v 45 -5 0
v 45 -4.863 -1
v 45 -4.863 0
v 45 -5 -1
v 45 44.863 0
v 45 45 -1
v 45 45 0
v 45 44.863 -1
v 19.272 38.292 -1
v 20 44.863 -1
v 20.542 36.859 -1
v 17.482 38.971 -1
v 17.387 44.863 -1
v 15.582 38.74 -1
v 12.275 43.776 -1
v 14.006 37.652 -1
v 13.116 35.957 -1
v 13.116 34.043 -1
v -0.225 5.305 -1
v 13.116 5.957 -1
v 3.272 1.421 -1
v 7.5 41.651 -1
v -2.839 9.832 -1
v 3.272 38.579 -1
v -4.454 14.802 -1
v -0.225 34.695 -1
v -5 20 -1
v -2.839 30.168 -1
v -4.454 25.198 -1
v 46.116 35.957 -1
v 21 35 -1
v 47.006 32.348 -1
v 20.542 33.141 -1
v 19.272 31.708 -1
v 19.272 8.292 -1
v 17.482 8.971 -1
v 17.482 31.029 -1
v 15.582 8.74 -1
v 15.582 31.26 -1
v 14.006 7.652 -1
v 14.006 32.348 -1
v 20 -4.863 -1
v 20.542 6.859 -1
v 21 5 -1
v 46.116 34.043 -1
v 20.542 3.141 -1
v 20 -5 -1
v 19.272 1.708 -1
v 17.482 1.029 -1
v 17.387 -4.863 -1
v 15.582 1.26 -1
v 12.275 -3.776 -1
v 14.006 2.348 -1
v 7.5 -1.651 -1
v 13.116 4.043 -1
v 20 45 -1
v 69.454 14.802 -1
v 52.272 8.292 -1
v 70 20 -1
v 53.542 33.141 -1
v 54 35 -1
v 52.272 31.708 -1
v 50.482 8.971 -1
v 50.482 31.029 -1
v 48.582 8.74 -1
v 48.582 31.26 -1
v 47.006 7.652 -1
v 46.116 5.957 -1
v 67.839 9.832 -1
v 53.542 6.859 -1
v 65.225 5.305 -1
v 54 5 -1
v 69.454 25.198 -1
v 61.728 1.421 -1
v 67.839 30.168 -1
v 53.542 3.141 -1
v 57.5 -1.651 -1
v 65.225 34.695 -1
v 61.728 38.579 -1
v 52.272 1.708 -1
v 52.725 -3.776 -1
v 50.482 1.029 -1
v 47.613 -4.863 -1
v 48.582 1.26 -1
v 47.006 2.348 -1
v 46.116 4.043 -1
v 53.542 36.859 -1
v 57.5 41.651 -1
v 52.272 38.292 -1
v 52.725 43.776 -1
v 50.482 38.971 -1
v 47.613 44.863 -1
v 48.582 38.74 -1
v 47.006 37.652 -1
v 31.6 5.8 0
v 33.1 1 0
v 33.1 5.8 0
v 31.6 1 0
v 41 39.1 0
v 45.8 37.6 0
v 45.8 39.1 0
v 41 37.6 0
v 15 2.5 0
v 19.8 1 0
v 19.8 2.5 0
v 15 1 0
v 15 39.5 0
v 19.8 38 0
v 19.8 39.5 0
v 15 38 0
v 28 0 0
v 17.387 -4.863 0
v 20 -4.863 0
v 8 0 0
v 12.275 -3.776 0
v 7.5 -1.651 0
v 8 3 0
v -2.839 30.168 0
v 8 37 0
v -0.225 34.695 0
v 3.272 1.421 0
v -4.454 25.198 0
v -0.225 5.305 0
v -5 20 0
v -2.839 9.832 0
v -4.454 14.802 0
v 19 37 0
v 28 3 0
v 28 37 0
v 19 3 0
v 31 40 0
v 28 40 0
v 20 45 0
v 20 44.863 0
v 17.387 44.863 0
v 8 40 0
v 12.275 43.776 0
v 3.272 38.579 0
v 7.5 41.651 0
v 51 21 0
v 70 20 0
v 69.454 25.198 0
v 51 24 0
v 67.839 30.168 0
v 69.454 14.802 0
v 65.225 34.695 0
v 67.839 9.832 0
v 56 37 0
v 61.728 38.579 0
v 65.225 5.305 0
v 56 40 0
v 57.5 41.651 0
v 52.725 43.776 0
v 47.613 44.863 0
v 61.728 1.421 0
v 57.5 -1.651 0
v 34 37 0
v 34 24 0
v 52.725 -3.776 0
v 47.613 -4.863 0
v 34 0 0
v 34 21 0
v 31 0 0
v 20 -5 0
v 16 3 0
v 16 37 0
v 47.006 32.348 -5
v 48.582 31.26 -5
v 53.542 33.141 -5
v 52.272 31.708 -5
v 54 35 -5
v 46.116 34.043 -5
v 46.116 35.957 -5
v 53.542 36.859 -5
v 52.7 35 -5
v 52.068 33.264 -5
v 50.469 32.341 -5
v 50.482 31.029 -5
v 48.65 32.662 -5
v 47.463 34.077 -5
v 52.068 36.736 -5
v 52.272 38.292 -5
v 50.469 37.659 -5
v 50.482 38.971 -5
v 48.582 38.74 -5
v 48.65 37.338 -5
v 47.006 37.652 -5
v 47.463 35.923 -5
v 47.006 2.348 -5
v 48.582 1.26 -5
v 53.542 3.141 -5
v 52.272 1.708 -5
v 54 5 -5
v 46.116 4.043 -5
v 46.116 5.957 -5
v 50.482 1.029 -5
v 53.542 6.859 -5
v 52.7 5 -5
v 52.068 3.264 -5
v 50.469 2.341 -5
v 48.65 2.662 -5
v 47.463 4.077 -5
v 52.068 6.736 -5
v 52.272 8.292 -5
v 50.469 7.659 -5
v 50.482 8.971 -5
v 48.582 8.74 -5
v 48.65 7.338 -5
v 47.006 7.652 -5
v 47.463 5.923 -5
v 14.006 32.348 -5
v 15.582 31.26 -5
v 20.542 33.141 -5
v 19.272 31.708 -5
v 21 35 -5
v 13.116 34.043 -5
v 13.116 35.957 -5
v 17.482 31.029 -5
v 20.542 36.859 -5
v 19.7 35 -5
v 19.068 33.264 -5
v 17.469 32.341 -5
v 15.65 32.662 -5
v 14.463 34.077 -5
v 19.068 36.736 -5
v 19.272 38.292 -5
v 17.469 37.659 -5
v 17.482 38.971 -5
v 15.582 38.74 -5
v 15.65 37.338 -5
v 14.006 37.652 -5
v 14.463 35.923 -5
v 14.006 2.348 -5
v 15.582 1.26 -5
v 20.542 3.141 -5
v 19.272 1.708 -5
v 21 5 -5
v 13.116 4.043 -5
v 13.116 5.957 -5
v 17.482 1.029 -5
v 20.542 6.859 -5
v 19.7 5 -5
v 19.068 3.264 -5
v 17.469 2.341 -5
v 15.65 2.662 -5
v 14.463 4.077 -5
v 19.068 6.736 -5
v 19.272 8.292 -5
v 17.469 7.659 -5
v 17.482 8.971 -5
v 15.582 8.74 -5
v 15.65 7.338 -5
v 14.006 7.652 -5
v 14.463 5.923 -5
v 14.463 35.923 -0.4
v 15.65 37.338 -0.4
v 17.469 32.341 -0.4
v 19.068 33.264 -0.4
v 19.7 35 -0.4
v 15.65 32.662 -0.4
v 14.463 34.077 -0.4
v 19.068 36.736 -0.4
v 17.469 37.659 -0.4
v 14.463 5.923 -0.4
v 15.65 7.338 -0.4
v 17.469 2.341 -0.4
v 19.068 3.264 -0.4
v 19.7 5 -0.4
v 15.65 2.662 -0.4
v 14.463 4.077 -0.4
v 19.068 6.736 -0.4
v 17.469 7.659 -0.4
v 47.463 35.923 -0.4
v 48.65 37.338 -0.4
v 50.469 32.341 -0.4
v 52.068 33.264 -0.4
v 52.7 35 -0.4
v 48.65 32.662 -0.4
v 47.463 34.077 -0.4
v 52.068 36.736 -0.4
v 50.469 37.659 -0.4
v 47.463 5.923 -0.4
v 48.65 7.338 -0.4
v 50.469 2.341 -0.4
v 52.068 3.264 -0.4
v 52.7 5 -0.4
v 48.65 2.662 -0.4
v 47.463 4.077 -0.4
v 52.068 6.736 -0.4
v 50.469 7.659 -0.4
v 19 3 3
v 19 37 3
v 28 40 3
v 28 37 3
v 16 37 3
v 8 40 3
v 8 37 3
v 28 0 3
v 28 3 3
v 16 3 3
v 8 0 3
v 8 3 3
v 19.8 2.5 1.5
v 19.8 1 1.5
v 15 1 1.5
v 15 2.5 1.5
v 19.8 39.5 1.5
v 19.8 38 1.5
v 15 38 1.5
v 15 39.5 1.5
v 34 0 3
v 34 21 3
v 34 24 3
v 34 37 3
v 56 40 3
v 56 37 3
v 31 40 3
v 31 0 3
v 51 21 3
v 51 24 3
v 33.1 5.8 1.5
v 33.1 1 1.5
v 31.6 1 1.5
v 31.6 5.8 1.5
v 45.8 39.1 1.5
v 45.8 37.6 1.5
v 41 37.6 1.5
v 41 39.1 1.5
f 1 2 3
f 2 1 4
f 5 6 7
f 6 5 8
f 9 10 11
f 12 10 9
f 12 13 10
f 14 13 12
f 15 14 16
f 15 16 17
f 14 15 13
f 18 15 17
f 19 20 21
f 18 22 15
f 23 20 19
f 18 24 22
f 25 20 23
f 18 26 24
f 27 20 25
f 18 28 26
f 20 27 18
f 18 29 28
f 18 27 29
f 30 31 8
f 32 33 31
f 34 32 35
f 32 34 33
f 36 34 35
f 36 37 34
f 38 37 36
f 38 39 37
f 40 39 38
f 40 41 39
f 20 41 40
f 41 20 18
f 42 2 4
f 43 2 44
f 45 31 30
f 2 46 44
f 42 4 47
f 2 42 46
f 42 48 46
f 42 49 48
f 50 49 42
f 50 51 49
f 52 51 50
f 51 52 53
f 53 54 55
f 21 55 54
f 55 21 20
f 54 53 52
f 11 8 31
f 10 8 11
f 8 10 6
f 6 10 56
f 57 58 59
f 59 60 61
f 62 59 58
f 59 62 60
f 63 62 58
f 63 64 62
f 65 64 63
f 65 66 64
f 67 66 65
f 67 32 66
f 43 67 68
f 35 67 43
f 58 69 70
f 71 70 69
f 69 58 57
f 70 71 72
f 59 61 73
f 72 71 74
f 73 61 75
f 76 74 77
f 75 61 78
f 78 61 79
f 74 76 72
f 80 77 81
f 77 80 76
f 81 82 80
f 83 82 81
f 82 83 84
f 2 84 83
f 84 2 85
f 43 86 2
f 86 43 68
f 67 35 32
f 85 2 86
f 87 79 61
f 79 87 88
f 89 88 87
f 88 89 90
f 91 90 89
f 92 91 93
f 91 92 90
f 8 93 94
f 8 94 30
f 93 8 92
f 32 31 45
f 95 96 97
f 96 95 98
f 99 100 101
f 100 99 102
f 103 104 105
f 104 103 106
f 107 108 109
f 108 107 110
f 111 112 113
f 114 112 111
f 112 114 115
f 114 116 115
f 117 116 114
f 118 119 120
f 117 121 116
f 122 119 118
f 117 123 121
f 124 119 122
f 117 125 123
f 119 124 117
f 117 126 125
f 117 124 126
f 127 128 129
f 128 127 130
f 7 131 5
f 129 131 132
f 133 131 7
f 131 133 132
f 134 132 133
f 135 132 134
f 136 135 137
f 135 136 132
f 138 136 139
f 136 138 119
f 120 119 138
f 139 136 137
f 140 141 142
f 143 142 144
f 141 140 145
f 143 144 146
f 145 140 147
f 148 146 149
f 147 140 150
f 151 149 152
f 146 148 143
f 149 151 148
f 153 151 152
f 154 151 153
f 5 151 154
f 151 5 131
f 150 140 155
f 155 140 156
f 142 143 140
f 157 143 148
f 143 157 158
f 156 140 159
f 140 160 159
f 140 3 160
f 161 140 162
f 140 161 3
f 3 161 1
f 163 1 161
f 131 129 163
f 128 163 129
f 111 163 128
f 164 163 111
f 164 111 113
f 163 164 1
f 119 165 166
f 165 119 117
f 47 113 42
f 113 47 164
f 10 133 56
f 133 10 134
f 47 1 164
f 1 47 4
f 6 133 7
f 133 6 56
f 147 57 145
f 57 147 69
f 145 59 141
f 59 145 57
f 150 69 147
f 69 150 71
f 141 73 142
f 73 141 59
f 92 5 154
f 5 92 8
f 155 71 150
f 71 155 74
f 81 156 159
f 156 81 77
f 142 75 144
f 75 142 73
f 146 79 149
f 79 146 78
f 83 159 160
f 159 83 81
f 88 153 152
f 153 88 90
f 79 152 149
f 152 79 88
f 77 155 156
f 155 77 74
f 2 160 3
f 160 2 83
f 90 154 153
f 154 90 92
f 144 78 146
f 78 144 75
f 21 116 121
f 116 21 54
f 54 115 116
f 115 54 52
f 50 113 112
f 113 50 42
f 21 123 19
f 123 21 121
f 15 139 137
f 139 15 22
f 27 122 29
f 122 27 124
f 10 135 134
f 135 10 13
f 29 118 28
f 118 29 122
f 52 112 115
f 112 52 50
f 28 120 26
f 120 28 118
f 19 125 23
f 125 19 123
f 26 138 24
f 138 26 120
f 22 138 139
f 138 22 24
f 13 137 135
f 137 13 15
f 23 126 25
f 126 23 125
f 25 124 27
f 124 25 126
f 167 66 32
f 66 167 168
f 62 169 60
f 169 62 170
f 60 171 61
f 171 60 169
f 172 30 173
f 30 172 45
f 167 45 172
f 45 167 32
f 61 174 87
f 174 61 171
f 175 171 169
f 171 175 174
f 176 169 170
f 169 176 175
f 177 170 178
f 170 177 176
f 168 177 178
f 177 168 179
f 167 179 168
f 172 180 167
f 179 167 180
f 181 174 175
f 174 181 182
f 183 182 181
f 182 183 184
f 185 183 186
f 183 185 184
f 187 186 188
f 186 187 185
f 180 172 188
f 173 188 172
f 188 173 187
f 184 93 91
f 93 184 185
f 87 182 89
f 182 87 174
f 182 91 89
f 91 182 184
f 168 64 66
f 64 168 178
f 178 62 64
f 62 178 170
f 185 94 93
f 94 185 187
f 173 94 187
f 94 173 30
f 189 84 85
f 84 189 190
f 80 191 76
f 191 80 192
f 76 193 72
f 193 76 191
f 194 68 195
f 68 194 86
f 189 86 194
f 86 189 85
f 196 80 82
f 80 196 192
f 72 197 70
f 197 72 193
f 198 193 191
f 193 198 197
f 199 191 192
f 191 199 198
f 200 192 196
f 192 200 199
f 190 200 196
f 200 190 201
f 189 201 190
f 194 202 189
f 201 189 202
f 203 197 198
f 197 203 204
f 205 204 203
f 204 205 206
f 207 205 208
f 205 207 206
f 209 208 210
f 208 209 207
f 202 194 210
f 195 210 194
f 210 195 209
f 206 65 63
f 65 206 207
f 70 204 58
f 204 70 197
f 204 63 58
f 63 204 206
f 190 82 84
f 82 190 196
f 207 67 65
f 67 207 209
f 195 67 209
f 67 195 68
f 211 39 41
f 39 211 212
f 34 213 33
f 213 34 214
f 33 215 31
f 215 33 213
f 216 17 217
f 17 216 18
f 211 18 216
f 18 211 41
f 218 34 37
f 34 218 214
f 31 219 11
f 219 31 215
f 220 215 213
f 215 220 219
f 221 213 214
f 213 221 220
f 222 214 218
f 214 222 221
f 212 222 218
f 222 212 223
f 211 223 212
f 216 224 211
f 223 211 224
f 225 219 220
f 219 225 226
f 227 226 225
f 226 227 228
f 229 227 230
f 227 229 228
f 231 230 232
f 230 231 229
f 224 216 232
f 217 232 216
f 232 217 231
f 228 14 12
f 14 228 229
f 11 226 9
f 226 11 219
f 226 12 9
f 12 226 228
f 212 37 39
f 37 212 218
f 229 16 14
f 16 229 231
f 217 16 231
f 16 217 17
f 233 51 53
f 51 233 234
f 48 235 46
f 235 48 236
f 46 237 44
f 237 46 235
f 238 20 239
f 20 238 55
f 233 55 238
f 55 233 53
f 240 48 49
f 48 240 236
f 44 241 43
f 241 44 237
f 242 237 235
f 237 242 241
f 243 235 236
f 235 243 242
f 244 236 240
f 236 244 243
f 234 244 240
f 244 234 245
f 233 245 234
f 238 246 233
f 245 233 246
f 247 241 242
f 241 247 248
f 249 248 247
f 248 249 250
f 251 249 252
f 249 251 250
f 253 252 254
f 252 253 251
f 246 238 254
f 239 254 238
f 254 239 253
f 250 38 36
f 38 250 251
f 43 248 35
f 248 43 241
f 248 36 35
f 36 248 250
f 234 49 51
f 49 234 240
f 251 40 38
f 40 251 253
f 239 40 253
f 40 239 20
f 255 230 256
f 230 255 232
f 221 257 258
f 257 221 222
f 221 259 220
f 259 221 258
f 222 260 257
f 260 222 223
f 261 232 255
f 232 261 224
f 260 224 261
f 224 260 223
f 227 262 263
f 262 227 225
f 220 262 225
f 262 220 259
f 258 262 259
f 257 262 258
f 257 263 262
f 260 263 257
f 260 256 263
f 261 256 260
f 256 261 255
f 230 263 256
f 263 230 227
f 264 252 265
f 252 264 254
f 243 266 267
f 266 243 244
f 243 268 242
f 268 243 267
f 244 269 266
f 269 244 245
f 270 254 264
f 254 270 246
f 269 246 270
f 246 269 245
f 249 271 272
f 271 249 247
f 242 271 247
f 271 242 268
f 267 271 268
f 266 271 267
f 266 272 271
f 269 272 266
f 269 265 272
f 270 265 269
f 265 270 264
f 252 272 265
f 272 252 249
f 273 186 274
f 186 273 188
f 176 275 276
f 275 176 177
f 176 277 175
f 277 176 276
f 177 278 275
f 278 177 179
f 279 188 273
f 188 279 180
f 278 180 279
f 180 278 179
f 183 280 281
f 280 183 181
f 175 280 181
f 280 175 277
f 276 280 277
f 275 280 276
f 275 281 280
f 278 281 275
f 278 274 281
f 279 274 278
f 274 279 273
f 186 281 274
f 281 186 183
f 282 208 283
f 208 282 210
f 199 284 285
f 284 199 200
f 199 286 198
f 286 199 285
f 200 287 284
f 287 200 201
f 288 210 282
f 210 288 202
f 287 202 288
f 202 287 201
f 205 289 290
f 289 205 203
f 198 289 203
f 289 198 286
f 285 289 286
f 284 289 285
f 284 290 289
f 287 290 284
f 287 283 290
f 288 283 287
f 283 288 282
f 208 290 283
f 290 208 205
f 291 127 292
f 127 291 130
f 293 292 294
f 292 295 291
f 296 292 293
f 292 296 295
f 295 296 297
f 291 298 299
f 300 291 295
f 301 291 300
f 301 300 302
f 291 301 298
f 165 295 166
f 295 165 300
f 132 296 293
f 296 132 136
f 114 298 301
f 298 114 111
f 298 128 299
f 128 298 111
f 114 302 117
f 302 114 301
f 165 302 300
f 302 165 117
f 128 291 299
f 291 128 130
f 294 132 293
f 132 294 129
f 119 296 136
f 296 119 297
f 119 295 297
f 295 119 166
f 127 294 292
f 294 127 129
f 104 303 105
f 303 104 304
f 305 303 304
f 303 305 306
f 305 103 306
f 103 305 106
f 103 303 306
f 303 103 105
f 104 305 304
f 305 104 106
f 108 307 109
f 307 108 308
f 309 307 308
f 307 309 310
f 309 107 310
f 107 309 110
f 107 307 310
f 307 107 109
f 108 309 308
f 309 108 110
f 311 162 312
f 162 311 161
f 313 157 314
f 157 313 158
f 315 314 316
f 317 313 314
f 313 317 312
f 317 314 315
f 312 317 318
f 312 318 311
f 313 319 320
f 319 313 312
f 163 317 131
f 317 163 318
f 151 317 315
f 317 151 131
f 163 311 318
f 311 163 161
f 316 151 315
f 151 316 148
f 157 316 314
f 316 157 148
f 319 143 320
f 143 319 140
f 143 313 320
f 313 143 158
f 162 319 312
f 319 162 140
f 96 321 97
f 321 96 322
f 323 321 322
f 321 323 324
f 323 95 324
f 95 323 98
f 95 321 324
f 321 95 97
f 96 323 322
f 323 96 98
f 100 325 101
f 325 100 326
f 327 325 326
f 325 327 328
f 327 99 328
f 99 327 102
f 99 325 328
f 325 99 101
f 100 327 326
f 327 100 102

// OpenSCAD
//основa
union(){
 rotate([0,900,180]) translate([20,-45,0])
difference(){  
 union(){  
  cube([25,50,1]);
   translate([25,25,0]) cylinder(1,25,25);
    translate([0,25,0]) cylinder(1,25,25);
  
  translate([30,10,0]) cylinder(5,4,4);
  translate([30,40,0]) cylinder(5,4,4);
  translate([-3,10,0]) cylinder(5,4,4);
  translate([-3,40,0]) cylinder(5,4,4);
}
  

  #translate([-3,10,0.4]) cylinder(5,2.7,2.7);
  #translate([-3,40,0.4]) cylinder(5,2.7,2.7);
  #translate([30,10,0.4]) cylinder(5,2.7,2.7);
  #translate([30,40,0.4]) cylinder(5,2.7,2.7);

  }


}
//I
translate([16,0,0])
difference(){
union(){ 
 cube([3,40,3]);
  translate([-8,0,0]) cube([20,3,3]);
  translate([-8,37,0]) cube([20,3,3]);
}
translate([-1,1,0]) cube([4.8,1.5,1.5]);
translate([-1,38,0]) cube([4.8,1.5,1.5]);
}

//F
translate([31,0,0])
difference(){
 union(){
  cube([3,40,3]);
  translate([0,37,0]) cube([25,3,3]);
  translate([0,21,0]) cube([20,3,3]);
}
 translate([0.6,1,0]) cube([1.5,4.8,1.5]);
 translate([10,37.6,0]) cube([4.8,1.5,1.5]);

}
